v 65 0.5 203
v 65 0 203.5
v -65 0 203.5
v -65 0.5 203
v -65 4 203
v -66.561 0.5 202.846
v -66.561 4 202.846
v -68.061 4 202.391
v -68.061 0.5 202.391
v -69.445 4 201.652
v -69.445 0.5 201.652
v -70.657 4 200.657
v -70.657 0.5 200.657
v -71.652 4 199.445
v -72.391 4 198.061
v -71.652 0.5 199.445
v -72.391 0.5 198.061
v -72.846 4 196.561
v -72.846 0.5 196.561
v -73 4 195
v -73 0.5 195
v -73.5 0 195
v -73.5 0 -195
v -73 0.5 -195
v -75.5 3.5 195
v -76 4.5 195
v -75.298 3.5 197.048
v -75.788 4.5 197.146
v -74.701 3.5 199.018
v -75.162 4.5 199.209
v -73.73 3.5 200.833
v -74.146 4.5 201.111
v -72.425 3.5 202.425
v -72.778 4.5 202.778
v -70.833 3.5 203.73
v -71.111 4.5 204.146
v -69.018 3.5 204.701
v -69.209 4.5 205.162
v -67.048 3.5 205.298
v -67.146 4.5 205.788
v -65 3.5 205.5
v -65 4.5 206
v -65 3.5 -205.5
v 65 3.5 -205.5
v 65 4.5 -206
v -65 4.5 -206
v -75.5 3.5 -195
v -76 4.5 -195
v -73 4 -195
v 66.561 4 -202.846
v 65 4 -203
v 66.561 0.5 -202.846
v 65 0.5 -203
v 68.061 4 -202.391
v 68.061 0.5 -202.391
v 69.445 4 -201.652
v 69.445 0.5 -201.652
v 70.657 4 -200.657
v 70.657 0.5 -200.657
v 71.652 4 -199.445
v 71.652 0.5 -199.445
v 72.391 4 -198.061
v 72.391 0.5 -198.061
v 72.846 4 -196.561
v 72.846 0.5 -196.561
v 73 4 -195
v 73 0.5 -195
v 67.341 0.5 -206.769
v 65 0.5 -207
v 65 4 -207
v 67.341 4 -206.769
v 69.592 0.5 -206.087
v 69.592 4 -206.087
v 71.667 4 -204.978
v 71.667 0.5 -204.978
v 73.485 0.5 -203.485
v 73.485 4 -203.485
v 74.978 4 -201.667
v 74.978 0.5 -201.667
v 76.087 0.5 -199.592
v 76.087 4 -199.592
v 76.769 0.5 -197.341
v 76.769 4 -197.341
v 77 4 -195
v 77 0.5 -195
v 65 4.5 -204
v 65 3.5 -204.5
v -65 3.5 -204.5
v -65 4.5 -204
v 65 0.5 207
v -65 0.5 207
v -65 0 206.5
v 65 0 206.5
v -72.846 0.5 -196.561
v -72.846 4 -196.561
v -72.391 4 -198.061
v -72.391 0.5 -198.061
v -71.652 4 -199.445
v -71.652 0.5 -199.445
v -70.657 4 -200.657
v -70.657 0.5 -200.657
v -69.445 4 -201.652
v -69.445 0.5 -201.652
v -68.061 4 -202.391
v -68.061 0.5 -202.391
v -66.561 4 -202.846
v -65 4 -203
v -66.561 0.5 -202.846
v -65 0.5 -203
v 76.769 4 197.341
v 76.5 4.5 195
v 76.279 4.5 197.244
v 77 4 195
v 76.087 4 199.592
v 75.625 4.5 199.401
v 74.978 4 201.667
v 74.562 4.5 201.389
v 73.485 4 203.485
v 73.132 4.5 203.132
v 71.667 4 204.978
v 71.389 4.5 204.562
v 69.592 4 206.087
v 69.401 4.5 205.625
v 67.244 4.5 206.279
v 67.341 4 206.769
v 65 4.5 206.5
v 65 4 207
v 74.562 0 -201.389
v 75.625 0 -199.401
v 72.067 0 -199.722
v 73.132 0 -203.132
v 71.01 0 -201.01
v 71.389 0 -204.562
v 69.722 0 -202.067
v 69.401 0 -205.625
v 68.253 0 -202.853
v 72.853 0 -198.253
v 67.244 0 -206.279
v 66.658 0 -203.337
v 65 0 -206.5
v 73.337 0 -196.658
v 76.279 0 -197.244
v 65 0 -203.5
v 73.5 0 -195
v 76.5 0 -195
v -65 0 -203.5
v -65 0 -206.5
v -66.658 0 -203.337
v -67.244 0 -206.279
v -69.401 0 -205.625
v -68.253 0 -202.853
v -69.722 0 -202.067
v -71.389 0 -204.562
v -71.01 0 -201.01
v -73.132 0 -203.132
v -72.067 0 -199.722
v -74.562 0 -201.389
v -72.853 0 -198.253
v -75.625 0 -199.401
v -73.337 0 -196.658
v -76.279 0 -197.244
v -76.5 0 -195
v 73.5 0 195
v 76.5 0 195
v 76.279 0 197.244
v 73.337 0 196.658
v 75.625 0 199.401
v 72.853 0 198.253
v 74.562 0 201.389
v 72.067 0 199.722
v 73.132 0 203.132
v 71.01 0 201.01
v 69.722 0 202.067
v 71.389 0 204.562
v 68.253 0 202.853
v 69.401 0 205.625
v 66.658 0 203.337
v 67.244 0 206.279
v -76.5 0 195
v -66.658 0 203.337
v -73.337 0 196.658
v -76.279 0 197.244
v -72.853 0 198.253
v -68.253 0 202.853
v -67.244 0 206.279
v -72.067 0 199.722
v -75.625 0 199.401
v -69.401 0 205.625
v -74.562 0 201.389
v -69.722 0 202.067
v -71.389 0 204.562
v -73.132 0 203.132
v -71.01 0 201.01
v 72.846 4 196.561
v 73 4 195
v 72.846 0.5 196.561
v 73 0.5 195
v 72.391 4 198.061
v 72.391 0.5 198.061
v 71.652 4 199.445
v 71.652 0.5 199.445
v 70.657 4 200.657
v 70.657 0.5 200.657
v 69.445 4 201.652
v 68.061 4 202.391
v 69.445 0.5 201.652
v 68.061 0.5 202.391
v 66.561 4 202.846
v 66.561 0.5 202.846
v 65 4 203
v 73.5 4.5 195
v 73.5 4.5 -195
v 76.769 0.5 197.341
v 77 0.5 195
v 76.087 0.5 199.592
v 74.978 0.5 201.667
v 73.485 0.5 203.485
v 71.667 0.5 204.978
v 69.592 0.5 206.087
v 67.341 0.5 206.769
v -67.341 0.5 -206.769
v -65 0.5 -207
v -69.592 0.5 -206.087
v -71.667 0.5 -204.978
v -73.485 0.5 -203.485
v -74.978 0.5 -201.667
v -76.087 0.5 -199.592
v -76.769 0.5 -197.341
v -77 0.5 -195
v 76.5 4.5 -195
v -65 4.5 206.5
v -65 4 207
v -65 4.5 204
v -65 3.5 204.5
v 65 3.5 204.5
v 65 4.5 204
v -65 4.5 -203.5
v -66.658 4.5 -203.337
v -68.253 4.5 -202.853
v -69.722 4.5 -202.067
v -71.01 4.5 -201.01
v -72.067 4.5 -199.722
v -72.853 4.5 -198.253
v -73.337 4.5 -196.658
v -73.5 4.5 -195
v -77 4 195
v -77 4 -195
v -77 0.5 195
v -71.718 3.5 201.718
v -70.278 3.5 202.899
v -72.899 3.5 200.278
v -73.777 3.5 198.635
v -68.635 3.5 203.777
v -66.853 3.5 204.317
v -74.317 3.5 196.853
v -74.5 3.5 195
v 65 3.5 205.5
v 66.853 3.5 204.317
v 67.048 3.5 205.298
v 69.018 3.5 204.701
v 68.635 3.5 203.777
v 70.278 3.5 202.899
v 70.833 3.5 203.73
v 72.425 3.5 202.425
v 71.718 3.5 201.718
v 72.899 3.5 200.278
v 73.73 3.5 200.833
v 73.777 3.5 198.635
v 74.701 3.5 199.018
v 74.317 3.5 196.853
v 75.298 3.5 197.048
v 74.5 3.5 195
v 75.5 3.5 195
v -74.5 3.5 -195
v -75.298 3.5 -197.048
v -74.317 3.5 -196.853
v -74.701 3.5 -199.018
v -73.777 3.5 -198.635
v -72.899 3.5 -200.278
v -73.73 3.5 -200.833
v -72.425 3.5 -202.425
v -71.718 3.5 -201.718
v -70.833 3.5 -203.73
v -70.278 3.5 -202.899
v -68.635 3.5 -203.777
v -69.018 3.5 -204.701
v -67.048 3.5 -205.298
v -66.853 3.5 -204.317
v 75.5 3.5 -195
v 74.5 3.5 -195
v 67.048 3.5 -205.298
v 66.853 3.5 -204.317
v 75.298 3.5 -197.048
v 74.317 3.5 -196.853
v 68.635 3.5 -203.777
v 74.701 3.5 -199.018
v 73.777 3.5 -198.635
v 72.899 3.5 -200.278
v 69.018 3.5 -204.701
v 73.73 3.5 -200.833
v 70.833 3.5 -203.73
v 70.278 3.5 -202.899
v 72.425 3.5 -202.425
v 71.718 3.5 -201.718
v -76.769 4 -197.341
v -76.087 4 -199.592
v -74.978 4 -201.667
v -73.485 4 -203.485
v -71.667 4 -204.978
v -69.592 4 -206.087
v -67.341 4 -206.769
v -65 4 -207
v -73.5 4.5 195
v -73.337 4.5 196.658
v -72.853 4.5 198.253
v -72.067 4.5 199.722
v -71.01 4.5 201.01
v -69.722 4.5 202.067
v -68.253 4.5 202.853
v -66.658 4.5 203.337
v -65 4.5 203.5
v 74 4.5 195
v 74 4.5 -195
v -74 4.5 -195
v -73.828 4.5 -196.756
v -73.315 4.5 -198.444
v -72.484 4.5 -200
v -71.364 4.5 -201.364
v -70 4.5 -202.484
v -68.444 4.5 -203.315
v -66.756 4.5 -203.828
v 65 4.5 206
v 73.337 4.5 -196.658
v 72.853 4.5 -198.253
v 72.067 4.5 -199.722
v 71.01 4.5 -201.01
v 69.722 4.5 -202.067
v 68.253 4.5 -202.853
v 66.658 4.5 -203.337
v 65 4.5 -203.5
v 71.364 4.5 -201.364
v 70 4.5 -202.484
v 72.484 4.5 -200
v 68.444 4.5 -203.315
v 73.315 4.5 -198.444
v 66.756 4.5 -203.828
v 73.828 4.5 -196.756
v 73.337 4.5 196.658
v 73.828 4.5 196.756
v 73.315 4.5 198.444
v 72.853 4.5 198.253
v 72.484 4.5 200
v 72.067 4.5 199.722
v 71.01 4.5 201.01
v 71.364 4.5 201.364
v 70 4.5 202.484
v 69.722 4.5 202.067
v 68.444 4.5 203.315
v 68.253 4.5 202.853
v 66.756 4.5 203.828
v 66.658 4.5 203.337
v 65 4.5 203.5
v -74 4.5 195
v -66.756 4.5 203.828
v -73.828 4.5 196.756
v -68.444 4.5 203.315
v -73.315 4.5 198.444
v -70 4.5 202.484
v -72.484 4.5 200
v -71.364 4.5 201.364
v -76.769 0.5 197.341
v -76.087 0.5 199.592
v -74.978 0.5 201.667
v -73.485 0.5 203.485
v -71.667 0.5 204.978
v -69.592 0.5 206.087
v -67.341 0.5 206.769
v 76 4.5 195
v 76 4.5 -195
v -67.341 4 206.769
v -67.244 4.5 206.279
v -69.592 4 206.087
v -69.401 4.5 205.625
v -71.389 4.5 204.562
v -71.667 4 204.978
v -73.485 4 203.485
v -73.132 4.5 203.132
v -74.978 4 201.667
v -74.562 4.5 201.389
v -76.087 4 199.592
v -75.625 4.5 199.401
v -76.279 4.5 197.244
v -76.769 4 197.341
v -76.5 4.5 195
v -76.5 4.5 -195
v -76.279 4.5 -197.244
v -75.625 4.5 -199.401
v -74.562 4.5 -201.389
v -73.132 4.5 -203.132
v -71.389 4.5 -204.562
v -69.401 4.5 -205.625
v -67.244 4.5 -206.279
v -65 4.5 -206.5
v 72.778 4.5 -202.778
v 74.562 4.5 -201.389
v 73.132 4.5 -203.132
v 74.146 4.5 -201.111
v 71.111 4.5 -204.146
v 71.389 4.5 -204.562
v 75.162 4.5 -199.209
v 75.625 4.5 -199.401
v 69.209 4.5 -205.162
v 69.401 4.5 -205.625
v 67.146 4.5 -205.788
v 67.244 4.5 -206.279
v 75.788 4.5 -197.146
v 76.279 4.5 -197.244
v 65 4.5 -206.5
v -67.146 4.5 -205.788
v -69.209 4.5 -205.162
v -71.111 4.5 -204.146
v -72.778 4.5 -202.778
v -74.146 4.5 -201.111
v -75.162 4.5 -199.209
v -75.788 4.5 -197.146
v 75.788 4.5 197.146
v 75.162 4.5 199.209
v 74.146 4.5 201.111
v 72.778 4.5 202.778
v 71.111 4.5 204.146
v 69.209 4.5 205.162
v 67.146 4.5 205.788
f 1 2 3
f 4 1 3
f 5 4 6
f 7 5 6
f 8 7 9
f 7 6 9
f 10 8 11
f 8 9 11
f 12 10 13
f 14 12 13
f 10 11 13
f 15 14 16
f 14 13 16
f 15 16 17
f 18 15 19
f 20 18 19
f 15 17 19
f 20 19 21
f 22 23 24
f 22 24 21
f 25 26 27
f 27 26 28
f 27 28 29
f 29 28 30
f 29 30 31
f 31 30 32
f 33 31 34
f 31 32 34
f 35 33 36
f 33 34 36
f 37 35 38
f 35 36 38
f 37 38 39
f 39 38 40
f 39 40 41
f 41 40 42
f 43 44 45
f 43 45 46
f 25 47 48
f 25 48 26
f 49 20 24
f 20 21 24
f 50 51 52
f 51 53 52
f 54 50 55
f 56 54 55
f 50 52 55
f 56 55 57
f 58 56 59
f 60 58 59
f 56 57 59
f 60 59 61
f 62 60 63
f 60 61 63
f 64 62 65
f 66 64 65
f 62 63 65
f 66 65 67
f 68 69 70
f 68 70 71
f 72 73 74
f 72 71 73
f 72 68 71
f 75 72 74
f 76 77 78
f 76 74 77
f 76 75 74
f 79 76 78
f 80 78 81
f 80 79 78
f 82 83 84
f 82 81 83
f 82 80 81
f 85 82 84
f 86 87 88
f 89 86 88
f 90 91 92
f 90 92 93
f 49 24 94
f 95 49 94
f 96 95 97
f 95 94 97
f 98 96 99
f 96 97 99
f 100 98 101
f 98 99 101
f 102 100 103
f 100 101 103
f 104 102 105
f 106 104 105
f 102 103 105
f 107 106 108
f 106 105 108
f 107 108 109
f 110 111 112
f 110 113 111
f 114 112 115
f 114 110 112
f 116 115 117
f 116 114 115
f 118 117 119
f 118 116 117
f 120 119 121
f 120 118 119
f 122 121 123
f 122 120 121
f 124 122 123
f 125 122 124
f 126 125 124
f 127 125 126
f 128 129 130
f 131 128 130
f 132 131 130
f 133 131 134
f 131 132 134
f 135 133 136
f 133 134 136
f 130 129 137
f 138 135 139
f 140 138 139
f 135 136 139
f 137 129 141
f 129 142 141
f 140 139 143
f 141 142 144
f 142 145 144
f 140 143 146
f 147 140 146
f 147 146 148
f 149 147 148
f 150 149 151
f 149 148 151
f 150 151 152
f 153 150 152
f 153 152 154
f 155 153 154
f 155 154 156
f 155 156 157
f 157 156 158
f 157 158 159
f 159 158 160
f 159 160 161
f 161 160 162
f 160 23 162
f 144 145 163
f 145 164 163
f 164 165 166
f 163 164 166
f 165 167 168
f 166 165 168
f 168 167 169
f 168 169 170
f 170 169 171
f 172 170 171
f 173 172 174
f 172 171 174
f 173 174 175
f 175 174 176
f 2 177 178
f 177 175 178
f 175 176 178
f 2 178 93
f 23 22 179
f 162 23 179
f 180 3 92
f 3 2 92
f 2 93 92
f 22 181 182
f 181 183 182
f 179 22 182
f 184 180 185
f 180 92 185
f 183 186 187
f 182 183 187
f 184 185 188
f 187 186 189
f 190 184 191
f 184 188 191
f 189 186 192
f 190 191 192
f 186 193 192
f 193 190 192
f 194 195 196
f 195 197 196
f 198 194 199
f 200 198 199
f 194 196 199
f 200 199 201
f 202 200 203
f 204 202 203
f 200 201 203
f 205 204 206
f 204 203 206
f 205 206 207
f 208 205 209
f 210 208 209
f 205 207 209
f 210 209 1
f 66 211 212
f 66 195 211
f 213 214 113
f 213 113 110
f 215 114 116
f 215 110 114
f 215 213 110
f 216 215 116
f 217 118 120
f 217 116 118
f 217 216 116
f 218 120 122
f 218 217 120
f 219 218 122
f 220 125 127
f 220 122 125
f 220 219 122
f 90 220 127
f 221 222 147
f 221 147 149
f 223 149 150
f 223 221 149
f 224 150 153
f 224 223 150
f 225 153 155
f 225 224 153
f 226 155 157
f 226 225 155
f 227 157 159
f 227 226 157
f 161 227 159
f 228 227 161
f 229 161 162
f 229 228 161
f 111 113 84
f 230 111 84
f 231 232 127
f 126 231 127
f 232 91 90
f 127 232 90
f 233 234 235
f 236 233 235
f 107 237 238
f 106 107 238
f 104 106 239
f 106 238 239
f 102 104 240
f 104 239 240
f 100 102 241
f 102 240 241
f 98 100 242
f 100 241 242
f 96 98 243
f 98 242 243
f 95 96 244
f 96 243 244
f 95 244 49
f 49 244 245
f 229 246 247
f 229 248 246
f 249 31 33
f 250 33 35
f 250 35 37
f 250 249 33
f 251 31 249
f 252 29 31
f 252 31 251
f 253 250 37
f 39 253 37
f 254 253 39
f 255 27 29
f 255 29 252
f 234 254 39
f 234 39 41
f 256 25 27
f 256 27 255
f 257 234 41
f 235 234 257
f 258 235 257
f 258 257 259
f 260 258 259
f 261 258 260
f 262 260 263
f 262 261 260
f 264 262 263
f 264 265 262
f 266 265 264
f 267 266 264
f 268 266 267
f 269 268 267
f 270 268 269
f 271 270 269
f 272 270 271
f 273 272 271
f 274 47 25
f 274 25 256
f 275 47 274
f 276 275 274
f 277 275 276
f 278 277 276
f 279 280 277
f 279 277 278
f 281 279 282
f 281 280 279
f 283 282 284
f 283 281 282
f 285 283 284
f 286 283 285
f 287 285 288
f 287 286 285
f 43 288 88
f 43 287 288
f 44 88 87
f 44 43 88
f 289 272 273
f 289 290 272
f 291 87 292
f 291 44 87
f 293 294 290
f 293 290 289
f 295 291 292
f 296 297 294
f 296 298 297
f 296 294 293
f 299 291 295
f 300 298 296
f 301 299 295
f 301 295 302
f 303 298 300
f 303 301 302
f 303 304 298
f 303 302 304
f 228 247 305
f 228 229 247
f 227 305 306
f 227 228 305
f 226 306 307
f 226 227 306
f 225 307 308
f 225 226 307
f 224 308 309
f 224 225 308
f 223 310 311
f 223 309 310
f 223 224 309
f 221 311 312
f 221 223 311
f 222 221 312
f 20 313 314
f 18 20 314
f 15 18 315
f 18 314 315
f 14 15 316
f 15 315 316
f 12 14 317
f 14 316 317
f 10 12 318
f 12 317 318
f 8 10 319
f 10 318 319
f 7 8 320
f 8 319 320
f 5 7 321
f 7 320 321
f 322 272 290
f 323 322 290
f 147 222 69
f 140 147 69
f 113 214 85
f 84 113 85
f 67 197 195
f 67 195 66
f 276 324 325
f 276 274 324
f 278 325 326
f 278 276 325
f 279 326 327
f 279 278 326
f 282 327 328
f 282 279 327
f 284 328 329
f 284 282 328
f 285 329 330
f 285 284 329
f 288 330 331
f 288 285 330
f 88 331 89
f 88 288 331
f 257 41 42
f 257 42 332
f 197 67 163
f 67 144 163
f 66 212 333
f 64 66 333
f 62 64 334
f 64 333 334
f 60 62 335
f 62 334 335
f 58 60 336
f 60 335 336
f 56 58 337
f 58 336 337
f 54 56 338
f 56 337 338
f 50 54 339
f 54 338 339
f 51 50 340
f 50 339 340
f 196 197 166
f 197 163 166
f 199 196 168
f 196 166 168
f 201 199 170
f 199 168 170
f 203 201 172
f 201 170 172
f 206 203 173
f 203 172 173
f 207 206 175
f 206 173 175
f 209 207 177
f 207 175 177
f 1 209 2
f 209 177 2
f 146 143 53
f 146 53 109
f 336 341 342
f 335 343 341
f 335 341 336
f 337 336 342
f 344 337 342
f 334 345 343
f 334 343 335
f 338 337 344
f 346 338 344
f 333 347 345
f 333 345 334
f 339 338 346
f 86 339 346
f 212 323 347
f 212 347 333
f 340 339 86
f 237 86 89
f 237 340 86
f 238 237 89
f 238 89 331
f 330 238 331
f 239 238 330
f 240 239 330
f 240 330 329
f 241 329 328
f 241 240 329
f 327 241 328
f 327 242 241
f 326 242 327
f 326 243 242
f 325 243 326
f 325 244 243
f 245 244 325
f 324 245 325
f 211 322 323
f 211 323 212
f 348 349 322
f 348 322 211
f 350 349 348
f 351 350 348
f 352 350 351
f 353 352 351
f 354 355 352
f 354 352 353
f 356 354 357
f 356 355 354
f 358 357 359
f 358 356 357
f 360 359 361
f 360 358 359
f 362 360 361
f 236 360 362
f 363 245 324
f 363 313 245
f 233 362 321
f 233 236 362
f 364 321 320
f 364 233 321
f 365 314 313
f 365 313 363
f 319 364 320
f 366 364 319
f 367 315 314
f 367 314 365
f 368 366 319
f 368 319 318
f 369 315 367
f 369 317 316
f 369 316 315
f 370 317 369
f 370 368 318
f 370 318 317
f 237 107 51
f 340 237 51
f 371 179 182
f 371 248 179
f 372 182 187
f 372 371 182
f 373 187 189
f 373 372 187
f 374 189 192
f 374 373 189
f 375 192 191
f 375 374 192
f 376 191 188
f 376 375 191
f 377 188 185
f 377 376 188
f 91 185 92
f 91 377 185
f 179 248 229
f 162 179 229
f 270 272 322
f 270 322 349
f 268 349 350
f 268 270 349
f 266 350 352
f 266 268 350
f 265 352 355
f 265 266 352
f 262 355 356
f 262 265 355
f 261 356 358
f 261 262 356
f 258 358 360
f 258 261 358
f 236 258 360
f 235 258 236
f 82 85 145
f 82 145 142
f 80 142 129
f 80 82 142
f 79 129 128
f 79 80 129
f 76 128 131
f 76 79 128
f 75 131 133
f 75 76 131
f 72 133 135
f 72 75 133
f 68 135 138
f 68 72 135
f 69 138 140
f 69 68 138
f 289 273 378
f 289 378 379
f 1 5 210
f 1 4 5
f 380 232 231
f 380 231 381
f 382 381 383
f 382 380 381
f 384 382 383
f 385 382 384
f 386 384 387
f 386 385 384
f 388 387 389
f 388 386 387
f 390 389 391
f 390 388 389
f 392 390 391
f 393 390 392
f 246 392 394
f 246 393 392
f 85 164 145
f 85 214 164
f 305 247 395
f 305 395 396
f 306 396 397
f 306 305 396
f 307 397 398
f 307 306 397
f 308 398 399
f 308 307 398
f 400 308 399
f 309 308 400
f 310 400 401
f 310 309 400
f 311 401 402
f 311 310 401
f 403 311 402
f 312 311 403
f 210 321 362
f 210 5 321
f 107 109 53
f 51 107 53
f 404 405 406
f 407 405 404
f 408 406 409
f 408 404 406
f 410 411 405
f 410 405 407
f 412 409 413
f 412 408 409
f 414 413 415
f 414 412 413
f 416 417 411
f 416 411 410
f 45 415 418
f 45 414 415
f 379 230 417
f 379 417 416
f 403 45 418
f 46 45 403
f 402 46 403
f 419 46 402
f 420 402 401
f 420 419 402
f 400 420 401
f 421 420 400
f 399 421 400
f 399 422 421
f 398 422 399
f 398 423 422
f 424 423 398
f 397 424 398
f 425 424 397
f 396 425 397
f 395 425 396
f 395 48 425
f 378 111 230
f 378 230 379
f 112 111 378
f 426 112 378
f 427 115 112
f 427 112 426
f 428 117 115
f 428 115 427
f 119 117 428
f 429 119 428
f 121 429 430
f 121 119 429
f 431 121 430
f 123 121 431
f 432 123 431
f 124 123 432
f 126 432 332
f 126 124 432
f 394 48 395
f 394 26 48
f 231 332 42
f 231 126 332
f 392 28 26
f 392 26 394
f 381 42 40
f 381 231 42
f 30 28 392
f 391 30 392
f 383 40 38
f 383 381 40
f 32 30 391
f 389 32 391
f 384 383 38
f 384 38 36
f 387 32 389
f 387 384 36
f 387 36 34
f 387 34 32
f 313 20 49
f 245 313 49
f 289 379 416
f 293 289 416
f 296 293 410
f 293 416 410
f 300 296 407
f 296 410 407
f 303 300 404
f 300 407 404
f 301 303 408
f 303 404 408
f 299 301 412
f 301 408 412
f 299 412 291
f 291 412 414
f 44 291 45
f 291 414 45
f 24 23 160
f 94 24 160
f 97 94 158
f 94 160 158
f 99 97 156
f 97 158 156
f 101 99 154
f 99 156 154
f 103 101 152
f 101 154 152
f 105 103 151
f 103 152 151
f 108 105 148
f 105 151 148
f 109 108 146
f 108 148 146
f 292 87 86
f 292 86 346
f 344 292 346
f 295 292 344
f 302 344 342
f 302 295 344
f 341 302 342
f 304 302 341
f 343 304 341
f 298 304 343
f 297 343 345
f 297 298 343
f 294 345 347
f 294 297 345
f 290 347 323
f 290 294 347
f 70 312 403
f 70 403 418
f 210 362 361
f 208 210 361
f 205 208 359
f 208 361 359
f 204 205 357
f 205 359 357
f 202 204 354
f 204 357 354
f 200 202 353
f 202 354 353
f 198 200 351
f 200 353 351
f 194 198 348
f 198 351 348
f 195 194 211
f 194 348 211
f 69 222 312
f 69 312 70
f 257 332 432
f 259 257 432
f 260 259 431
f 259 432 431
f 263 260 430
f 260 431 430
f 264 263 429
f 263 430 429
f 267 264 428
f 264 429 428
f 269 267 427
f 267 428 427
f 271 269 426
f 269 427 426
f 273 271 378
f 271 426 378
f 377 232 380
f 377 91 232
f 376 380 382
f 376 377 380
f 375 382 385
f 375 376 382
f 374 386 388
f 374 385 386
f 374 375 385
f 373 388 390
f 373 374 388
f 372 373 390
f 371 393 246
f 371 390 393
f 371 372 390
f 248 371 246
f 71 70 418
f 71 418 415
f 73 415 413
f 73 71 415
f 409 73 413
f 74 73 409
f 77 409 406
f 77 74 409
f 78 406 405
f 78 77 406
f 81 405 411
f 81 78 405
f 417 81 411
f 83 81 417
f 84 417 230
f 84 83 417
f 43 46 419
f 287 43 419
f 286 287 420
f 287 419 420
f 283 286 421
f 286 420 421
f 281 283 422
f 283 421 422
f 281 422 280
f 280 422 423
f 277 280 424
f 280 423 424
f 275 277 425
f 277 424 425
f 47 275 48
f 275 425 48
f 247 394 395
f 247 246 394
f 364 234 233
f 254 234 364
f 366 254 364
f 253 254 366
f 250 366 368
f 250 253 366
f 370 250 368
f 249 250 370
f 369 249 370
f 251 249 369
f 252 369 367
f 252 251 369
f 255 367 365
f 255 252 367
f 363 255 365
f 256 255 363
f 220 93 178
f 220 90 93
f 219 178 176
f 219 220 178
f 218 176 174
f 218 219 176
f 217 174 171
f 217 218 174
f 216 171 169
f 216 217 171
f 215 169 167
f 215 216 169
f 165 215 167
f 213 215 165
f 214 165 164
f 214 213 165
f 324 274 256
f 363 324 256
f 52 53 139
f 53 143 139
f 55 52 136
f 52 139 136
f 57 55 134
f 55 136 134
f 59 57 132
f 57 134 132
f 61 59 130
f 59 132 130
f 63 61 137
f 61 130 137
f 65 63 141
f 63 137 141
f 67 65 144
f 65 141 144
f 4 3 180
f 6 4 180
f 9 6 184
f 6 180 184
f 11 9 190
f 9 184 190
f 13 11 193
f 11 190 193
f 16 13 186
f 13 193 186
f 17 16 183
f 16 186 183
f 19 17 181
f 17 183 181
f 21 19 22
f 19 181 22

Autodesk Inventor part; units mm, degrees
ref_plane "YZ Plane" through (0, 0, 0) normal (1, 0, 0) x (0, 1, 0)
ref_plane "XZ Plane" through (0, 0, 0) normal (0, 1, 0) x (-1, 0, 0)
ref_plane "XY Plane" through (0, 0, 0) normal (0, 0, 1) x (1, 0, 0)
sketch "Sketch1" plane through (0, 0, 0) normal (0, 1, 0) x (-1, 0, 0)
  circle A0 centre (65, 195) radius 12
  circle A1 centre (65, -195) radius 12
  circle A2 centre (-65, 195) radius 12
  circle A3 centre (-65, -195) radius 12
  line L0 (77, 195) -> (77, -195)
  line L1 (65, -207) -> (-65, -207)
  line L2 (65, 207) -> (-65, 207)
  line L3 (-77, 195) -> (-77, -195)
  line L4 (73, 195) -> (73, -195)
  circle A4 centre (65, 195) radius 8
  line L5 (65, 203) -> (-65, 203)
  circle A5 centre (-65, 195) radius 8
  line L6 (-73, 195) -> (-73, -195)
  circle A6 centre (-65, -195) radius 8
  line L7 (65, -203) -> (-65, -203)
  circle A7 centre (65, -195) radius 8
  point P0 (0, 0)
  point P1 (77, 0)
  point P2 (0, 207)
  point P3 (35, 143)
  point P4 (68, 135)
  point P5 (68, -135)
  point P6 (35, -143)
  point P7 (-60, -203)
  point P8 (-68, -135)
  point P9 (-68, 135)
  point P10 (-60, 203)
  dimension "d0" = 24
  dimension "d1" = 24
  dimension "d2" = 24
  dimension "d3" = 24
  dimension "d6" = 4
  dimension "d7" = 4
  dimension "d8" = 4
  dimension "d9" = 4
  dimension "d10" = 4
  dimension "d11" = 4
  dimension "d12" = 4
  dimension "d13" = 4
  dimension "d35" = 414
  dimension "d36" = 154
extrude "Extrusion1" add sketch "Sketch1" along normal blind 4.5 contours A0 L4 A4 L5 | L0 A1 L4 A0 | A0 L5 A2 L2 | A1 L7 A7 L4 | A2 L5 A5 L6 | L1 A3 L7 A1 | A2 L6 A3 L3 | A3 L6 A6 L7 picked at (59.6594, 203.5636) picked at (59.6594, -203.5636) picked at (-59.6594, 203.5636) picked at (-59.6594, -203.5636)
sketch "Sketch2" plane through (0, 4.5, 0) normal (0, 1, 0) x (1, 0, 0)
  line L0 (-77, 195) -> (-77, -195) projected
  arc A0 (-77, -195) -> (-65, -207) centre (-65, -195) ccw projected
  line L1 (-65, -207) -> (65, -207) projected
  arc A1 (65, -207) -> (77, -195) centre (65, -195) ccw projected
  line L2 (77, -195) -> (77, 195) projected
  arc A2 (77, 195) -> (65, 207) centre (65, 195) ccw projected
  line L3 (65, 207) -> (-65, 207) projected
  arc A3 (-65, 207) -> (-77, 195) centre (-65, 195) ccw projected
  line L4 (-74.5, -195) -> (-74.5, 195)
  arc A4 (-65, 204.5) -> (-74.5, 195) centre (-65, 195) ccw
  line L5 (-65, 204.5) -> (65, 204.5)
  arc A5 (74.5, 195) -> (65, 204.5) centre (65, 195) ccw
  line L6 (74.5, 195) -> (74.5, -195)
  arc A6 (65, -204.5) -> (74.5, -195) centre (65, -195) ccw
  line L7 (65, -204.5) -> (-65, -204.5)
  arc A7 (-74.5, -195) -> (-65, -204.5) centre (-65, -195) ccw
  line L8 (-75.5, -195) -> (-75.5, 195)
  arc A8 (-65, 205.5) -> (-75.5, 195) centre (-65, 195) ccw
  line L9 (-65, 205.5) -> (65, 205.5)
  arc A9 (75.5, 195) -> (65, 205.5) centre (65, 195) ccw
  line L10 (75.5, 195) -> (75.5, -195)
  arc A10 (65, -205.5) -> (75.5, -195) centre (65, -195) ccw
  line L11 (65, -205.5) -> (-65, -205.5)
  arc A11 (-75.5, -195) -> (-65, -205.5) centre (-65, -195) ccw
  point P0 (0, 0)
  dimension "d16" = 2.5
  dimension "d17" = 1.5
extrude "Extrusion2" cut sketch "Sketch2" against normal blind 1 contours L8 A8 L9 A9 L10 A10 L11 A11
chamfer "Chamfer3" distance 0.5 distance2 1 8 edges at (0, 4.5, 205.5) (-72.4246, 4.5, 202.4246) (-75.5, 4.5, 0) (-72.4246, 4.5, -202.4246) (0, 4.5, -205.5) (72.4246, 4.5, -202.4246) (75.5, 4.5, 0) (72.4246, 4.5, 202.4246) measured on face at (76, 4.5, -65)
chamfer "Chamfer4" distance 0.5 distance2 1 8 edges at (0, 4.5, 204.5) (71.7175, 4.5, 201.7175) (74.5, 4.5, 0) (71.7175, 4.5, -201.7175) (0, 4.5, -204.5) (-71.7175, 4.5, -201.7175) (-74.5, 4.5, 0) (-71.7175, 4.5, 201.7175) measured on face at (-74, 4.5, -65)
chamfer "Chamfer5" distance 0.5 angle 45 32 edges at (0, 4.5, 207) (73.4853, 4.5, 203.4853) (77, 4.5, 0) (73.4853, 4.5, -203.4853) (0, 4.5, -207) (-73.4853, 4.5, -203.4853) (-77, 4.5, 0) (-73.4853, 4.5, 203.4853) (0, 4.5, 203) (-70.6569, 4.5, 200.6569) (-73, 4.5, 0) (-70.6569, 4.5, -200.6569) (0, 4.5, -203) (70.6569, 4.5, -200.6569) (73, 4.5, 0) (70.6569, 4.5, 200.6569) (73.4853, 0, 203.4853) (77, 0, 0) (73.4853, 0, -203.4853) (0, 0, -207) (-73.4853, 0, -203.4853) (-77, 0, 0) (-73.4853, 0, 203.4853) (0, 0, 207) (0, 0, 203) (-70.6569, 0, 200.6569) (-73, 0, 0) (-70.6569, 0, -200.6569) (0, 0, -203) (70.6569, 0, -200.6569) (73, 0, 0) (70.6569, 0, 200.6569)
properties part number "LI0005-SEAL"
